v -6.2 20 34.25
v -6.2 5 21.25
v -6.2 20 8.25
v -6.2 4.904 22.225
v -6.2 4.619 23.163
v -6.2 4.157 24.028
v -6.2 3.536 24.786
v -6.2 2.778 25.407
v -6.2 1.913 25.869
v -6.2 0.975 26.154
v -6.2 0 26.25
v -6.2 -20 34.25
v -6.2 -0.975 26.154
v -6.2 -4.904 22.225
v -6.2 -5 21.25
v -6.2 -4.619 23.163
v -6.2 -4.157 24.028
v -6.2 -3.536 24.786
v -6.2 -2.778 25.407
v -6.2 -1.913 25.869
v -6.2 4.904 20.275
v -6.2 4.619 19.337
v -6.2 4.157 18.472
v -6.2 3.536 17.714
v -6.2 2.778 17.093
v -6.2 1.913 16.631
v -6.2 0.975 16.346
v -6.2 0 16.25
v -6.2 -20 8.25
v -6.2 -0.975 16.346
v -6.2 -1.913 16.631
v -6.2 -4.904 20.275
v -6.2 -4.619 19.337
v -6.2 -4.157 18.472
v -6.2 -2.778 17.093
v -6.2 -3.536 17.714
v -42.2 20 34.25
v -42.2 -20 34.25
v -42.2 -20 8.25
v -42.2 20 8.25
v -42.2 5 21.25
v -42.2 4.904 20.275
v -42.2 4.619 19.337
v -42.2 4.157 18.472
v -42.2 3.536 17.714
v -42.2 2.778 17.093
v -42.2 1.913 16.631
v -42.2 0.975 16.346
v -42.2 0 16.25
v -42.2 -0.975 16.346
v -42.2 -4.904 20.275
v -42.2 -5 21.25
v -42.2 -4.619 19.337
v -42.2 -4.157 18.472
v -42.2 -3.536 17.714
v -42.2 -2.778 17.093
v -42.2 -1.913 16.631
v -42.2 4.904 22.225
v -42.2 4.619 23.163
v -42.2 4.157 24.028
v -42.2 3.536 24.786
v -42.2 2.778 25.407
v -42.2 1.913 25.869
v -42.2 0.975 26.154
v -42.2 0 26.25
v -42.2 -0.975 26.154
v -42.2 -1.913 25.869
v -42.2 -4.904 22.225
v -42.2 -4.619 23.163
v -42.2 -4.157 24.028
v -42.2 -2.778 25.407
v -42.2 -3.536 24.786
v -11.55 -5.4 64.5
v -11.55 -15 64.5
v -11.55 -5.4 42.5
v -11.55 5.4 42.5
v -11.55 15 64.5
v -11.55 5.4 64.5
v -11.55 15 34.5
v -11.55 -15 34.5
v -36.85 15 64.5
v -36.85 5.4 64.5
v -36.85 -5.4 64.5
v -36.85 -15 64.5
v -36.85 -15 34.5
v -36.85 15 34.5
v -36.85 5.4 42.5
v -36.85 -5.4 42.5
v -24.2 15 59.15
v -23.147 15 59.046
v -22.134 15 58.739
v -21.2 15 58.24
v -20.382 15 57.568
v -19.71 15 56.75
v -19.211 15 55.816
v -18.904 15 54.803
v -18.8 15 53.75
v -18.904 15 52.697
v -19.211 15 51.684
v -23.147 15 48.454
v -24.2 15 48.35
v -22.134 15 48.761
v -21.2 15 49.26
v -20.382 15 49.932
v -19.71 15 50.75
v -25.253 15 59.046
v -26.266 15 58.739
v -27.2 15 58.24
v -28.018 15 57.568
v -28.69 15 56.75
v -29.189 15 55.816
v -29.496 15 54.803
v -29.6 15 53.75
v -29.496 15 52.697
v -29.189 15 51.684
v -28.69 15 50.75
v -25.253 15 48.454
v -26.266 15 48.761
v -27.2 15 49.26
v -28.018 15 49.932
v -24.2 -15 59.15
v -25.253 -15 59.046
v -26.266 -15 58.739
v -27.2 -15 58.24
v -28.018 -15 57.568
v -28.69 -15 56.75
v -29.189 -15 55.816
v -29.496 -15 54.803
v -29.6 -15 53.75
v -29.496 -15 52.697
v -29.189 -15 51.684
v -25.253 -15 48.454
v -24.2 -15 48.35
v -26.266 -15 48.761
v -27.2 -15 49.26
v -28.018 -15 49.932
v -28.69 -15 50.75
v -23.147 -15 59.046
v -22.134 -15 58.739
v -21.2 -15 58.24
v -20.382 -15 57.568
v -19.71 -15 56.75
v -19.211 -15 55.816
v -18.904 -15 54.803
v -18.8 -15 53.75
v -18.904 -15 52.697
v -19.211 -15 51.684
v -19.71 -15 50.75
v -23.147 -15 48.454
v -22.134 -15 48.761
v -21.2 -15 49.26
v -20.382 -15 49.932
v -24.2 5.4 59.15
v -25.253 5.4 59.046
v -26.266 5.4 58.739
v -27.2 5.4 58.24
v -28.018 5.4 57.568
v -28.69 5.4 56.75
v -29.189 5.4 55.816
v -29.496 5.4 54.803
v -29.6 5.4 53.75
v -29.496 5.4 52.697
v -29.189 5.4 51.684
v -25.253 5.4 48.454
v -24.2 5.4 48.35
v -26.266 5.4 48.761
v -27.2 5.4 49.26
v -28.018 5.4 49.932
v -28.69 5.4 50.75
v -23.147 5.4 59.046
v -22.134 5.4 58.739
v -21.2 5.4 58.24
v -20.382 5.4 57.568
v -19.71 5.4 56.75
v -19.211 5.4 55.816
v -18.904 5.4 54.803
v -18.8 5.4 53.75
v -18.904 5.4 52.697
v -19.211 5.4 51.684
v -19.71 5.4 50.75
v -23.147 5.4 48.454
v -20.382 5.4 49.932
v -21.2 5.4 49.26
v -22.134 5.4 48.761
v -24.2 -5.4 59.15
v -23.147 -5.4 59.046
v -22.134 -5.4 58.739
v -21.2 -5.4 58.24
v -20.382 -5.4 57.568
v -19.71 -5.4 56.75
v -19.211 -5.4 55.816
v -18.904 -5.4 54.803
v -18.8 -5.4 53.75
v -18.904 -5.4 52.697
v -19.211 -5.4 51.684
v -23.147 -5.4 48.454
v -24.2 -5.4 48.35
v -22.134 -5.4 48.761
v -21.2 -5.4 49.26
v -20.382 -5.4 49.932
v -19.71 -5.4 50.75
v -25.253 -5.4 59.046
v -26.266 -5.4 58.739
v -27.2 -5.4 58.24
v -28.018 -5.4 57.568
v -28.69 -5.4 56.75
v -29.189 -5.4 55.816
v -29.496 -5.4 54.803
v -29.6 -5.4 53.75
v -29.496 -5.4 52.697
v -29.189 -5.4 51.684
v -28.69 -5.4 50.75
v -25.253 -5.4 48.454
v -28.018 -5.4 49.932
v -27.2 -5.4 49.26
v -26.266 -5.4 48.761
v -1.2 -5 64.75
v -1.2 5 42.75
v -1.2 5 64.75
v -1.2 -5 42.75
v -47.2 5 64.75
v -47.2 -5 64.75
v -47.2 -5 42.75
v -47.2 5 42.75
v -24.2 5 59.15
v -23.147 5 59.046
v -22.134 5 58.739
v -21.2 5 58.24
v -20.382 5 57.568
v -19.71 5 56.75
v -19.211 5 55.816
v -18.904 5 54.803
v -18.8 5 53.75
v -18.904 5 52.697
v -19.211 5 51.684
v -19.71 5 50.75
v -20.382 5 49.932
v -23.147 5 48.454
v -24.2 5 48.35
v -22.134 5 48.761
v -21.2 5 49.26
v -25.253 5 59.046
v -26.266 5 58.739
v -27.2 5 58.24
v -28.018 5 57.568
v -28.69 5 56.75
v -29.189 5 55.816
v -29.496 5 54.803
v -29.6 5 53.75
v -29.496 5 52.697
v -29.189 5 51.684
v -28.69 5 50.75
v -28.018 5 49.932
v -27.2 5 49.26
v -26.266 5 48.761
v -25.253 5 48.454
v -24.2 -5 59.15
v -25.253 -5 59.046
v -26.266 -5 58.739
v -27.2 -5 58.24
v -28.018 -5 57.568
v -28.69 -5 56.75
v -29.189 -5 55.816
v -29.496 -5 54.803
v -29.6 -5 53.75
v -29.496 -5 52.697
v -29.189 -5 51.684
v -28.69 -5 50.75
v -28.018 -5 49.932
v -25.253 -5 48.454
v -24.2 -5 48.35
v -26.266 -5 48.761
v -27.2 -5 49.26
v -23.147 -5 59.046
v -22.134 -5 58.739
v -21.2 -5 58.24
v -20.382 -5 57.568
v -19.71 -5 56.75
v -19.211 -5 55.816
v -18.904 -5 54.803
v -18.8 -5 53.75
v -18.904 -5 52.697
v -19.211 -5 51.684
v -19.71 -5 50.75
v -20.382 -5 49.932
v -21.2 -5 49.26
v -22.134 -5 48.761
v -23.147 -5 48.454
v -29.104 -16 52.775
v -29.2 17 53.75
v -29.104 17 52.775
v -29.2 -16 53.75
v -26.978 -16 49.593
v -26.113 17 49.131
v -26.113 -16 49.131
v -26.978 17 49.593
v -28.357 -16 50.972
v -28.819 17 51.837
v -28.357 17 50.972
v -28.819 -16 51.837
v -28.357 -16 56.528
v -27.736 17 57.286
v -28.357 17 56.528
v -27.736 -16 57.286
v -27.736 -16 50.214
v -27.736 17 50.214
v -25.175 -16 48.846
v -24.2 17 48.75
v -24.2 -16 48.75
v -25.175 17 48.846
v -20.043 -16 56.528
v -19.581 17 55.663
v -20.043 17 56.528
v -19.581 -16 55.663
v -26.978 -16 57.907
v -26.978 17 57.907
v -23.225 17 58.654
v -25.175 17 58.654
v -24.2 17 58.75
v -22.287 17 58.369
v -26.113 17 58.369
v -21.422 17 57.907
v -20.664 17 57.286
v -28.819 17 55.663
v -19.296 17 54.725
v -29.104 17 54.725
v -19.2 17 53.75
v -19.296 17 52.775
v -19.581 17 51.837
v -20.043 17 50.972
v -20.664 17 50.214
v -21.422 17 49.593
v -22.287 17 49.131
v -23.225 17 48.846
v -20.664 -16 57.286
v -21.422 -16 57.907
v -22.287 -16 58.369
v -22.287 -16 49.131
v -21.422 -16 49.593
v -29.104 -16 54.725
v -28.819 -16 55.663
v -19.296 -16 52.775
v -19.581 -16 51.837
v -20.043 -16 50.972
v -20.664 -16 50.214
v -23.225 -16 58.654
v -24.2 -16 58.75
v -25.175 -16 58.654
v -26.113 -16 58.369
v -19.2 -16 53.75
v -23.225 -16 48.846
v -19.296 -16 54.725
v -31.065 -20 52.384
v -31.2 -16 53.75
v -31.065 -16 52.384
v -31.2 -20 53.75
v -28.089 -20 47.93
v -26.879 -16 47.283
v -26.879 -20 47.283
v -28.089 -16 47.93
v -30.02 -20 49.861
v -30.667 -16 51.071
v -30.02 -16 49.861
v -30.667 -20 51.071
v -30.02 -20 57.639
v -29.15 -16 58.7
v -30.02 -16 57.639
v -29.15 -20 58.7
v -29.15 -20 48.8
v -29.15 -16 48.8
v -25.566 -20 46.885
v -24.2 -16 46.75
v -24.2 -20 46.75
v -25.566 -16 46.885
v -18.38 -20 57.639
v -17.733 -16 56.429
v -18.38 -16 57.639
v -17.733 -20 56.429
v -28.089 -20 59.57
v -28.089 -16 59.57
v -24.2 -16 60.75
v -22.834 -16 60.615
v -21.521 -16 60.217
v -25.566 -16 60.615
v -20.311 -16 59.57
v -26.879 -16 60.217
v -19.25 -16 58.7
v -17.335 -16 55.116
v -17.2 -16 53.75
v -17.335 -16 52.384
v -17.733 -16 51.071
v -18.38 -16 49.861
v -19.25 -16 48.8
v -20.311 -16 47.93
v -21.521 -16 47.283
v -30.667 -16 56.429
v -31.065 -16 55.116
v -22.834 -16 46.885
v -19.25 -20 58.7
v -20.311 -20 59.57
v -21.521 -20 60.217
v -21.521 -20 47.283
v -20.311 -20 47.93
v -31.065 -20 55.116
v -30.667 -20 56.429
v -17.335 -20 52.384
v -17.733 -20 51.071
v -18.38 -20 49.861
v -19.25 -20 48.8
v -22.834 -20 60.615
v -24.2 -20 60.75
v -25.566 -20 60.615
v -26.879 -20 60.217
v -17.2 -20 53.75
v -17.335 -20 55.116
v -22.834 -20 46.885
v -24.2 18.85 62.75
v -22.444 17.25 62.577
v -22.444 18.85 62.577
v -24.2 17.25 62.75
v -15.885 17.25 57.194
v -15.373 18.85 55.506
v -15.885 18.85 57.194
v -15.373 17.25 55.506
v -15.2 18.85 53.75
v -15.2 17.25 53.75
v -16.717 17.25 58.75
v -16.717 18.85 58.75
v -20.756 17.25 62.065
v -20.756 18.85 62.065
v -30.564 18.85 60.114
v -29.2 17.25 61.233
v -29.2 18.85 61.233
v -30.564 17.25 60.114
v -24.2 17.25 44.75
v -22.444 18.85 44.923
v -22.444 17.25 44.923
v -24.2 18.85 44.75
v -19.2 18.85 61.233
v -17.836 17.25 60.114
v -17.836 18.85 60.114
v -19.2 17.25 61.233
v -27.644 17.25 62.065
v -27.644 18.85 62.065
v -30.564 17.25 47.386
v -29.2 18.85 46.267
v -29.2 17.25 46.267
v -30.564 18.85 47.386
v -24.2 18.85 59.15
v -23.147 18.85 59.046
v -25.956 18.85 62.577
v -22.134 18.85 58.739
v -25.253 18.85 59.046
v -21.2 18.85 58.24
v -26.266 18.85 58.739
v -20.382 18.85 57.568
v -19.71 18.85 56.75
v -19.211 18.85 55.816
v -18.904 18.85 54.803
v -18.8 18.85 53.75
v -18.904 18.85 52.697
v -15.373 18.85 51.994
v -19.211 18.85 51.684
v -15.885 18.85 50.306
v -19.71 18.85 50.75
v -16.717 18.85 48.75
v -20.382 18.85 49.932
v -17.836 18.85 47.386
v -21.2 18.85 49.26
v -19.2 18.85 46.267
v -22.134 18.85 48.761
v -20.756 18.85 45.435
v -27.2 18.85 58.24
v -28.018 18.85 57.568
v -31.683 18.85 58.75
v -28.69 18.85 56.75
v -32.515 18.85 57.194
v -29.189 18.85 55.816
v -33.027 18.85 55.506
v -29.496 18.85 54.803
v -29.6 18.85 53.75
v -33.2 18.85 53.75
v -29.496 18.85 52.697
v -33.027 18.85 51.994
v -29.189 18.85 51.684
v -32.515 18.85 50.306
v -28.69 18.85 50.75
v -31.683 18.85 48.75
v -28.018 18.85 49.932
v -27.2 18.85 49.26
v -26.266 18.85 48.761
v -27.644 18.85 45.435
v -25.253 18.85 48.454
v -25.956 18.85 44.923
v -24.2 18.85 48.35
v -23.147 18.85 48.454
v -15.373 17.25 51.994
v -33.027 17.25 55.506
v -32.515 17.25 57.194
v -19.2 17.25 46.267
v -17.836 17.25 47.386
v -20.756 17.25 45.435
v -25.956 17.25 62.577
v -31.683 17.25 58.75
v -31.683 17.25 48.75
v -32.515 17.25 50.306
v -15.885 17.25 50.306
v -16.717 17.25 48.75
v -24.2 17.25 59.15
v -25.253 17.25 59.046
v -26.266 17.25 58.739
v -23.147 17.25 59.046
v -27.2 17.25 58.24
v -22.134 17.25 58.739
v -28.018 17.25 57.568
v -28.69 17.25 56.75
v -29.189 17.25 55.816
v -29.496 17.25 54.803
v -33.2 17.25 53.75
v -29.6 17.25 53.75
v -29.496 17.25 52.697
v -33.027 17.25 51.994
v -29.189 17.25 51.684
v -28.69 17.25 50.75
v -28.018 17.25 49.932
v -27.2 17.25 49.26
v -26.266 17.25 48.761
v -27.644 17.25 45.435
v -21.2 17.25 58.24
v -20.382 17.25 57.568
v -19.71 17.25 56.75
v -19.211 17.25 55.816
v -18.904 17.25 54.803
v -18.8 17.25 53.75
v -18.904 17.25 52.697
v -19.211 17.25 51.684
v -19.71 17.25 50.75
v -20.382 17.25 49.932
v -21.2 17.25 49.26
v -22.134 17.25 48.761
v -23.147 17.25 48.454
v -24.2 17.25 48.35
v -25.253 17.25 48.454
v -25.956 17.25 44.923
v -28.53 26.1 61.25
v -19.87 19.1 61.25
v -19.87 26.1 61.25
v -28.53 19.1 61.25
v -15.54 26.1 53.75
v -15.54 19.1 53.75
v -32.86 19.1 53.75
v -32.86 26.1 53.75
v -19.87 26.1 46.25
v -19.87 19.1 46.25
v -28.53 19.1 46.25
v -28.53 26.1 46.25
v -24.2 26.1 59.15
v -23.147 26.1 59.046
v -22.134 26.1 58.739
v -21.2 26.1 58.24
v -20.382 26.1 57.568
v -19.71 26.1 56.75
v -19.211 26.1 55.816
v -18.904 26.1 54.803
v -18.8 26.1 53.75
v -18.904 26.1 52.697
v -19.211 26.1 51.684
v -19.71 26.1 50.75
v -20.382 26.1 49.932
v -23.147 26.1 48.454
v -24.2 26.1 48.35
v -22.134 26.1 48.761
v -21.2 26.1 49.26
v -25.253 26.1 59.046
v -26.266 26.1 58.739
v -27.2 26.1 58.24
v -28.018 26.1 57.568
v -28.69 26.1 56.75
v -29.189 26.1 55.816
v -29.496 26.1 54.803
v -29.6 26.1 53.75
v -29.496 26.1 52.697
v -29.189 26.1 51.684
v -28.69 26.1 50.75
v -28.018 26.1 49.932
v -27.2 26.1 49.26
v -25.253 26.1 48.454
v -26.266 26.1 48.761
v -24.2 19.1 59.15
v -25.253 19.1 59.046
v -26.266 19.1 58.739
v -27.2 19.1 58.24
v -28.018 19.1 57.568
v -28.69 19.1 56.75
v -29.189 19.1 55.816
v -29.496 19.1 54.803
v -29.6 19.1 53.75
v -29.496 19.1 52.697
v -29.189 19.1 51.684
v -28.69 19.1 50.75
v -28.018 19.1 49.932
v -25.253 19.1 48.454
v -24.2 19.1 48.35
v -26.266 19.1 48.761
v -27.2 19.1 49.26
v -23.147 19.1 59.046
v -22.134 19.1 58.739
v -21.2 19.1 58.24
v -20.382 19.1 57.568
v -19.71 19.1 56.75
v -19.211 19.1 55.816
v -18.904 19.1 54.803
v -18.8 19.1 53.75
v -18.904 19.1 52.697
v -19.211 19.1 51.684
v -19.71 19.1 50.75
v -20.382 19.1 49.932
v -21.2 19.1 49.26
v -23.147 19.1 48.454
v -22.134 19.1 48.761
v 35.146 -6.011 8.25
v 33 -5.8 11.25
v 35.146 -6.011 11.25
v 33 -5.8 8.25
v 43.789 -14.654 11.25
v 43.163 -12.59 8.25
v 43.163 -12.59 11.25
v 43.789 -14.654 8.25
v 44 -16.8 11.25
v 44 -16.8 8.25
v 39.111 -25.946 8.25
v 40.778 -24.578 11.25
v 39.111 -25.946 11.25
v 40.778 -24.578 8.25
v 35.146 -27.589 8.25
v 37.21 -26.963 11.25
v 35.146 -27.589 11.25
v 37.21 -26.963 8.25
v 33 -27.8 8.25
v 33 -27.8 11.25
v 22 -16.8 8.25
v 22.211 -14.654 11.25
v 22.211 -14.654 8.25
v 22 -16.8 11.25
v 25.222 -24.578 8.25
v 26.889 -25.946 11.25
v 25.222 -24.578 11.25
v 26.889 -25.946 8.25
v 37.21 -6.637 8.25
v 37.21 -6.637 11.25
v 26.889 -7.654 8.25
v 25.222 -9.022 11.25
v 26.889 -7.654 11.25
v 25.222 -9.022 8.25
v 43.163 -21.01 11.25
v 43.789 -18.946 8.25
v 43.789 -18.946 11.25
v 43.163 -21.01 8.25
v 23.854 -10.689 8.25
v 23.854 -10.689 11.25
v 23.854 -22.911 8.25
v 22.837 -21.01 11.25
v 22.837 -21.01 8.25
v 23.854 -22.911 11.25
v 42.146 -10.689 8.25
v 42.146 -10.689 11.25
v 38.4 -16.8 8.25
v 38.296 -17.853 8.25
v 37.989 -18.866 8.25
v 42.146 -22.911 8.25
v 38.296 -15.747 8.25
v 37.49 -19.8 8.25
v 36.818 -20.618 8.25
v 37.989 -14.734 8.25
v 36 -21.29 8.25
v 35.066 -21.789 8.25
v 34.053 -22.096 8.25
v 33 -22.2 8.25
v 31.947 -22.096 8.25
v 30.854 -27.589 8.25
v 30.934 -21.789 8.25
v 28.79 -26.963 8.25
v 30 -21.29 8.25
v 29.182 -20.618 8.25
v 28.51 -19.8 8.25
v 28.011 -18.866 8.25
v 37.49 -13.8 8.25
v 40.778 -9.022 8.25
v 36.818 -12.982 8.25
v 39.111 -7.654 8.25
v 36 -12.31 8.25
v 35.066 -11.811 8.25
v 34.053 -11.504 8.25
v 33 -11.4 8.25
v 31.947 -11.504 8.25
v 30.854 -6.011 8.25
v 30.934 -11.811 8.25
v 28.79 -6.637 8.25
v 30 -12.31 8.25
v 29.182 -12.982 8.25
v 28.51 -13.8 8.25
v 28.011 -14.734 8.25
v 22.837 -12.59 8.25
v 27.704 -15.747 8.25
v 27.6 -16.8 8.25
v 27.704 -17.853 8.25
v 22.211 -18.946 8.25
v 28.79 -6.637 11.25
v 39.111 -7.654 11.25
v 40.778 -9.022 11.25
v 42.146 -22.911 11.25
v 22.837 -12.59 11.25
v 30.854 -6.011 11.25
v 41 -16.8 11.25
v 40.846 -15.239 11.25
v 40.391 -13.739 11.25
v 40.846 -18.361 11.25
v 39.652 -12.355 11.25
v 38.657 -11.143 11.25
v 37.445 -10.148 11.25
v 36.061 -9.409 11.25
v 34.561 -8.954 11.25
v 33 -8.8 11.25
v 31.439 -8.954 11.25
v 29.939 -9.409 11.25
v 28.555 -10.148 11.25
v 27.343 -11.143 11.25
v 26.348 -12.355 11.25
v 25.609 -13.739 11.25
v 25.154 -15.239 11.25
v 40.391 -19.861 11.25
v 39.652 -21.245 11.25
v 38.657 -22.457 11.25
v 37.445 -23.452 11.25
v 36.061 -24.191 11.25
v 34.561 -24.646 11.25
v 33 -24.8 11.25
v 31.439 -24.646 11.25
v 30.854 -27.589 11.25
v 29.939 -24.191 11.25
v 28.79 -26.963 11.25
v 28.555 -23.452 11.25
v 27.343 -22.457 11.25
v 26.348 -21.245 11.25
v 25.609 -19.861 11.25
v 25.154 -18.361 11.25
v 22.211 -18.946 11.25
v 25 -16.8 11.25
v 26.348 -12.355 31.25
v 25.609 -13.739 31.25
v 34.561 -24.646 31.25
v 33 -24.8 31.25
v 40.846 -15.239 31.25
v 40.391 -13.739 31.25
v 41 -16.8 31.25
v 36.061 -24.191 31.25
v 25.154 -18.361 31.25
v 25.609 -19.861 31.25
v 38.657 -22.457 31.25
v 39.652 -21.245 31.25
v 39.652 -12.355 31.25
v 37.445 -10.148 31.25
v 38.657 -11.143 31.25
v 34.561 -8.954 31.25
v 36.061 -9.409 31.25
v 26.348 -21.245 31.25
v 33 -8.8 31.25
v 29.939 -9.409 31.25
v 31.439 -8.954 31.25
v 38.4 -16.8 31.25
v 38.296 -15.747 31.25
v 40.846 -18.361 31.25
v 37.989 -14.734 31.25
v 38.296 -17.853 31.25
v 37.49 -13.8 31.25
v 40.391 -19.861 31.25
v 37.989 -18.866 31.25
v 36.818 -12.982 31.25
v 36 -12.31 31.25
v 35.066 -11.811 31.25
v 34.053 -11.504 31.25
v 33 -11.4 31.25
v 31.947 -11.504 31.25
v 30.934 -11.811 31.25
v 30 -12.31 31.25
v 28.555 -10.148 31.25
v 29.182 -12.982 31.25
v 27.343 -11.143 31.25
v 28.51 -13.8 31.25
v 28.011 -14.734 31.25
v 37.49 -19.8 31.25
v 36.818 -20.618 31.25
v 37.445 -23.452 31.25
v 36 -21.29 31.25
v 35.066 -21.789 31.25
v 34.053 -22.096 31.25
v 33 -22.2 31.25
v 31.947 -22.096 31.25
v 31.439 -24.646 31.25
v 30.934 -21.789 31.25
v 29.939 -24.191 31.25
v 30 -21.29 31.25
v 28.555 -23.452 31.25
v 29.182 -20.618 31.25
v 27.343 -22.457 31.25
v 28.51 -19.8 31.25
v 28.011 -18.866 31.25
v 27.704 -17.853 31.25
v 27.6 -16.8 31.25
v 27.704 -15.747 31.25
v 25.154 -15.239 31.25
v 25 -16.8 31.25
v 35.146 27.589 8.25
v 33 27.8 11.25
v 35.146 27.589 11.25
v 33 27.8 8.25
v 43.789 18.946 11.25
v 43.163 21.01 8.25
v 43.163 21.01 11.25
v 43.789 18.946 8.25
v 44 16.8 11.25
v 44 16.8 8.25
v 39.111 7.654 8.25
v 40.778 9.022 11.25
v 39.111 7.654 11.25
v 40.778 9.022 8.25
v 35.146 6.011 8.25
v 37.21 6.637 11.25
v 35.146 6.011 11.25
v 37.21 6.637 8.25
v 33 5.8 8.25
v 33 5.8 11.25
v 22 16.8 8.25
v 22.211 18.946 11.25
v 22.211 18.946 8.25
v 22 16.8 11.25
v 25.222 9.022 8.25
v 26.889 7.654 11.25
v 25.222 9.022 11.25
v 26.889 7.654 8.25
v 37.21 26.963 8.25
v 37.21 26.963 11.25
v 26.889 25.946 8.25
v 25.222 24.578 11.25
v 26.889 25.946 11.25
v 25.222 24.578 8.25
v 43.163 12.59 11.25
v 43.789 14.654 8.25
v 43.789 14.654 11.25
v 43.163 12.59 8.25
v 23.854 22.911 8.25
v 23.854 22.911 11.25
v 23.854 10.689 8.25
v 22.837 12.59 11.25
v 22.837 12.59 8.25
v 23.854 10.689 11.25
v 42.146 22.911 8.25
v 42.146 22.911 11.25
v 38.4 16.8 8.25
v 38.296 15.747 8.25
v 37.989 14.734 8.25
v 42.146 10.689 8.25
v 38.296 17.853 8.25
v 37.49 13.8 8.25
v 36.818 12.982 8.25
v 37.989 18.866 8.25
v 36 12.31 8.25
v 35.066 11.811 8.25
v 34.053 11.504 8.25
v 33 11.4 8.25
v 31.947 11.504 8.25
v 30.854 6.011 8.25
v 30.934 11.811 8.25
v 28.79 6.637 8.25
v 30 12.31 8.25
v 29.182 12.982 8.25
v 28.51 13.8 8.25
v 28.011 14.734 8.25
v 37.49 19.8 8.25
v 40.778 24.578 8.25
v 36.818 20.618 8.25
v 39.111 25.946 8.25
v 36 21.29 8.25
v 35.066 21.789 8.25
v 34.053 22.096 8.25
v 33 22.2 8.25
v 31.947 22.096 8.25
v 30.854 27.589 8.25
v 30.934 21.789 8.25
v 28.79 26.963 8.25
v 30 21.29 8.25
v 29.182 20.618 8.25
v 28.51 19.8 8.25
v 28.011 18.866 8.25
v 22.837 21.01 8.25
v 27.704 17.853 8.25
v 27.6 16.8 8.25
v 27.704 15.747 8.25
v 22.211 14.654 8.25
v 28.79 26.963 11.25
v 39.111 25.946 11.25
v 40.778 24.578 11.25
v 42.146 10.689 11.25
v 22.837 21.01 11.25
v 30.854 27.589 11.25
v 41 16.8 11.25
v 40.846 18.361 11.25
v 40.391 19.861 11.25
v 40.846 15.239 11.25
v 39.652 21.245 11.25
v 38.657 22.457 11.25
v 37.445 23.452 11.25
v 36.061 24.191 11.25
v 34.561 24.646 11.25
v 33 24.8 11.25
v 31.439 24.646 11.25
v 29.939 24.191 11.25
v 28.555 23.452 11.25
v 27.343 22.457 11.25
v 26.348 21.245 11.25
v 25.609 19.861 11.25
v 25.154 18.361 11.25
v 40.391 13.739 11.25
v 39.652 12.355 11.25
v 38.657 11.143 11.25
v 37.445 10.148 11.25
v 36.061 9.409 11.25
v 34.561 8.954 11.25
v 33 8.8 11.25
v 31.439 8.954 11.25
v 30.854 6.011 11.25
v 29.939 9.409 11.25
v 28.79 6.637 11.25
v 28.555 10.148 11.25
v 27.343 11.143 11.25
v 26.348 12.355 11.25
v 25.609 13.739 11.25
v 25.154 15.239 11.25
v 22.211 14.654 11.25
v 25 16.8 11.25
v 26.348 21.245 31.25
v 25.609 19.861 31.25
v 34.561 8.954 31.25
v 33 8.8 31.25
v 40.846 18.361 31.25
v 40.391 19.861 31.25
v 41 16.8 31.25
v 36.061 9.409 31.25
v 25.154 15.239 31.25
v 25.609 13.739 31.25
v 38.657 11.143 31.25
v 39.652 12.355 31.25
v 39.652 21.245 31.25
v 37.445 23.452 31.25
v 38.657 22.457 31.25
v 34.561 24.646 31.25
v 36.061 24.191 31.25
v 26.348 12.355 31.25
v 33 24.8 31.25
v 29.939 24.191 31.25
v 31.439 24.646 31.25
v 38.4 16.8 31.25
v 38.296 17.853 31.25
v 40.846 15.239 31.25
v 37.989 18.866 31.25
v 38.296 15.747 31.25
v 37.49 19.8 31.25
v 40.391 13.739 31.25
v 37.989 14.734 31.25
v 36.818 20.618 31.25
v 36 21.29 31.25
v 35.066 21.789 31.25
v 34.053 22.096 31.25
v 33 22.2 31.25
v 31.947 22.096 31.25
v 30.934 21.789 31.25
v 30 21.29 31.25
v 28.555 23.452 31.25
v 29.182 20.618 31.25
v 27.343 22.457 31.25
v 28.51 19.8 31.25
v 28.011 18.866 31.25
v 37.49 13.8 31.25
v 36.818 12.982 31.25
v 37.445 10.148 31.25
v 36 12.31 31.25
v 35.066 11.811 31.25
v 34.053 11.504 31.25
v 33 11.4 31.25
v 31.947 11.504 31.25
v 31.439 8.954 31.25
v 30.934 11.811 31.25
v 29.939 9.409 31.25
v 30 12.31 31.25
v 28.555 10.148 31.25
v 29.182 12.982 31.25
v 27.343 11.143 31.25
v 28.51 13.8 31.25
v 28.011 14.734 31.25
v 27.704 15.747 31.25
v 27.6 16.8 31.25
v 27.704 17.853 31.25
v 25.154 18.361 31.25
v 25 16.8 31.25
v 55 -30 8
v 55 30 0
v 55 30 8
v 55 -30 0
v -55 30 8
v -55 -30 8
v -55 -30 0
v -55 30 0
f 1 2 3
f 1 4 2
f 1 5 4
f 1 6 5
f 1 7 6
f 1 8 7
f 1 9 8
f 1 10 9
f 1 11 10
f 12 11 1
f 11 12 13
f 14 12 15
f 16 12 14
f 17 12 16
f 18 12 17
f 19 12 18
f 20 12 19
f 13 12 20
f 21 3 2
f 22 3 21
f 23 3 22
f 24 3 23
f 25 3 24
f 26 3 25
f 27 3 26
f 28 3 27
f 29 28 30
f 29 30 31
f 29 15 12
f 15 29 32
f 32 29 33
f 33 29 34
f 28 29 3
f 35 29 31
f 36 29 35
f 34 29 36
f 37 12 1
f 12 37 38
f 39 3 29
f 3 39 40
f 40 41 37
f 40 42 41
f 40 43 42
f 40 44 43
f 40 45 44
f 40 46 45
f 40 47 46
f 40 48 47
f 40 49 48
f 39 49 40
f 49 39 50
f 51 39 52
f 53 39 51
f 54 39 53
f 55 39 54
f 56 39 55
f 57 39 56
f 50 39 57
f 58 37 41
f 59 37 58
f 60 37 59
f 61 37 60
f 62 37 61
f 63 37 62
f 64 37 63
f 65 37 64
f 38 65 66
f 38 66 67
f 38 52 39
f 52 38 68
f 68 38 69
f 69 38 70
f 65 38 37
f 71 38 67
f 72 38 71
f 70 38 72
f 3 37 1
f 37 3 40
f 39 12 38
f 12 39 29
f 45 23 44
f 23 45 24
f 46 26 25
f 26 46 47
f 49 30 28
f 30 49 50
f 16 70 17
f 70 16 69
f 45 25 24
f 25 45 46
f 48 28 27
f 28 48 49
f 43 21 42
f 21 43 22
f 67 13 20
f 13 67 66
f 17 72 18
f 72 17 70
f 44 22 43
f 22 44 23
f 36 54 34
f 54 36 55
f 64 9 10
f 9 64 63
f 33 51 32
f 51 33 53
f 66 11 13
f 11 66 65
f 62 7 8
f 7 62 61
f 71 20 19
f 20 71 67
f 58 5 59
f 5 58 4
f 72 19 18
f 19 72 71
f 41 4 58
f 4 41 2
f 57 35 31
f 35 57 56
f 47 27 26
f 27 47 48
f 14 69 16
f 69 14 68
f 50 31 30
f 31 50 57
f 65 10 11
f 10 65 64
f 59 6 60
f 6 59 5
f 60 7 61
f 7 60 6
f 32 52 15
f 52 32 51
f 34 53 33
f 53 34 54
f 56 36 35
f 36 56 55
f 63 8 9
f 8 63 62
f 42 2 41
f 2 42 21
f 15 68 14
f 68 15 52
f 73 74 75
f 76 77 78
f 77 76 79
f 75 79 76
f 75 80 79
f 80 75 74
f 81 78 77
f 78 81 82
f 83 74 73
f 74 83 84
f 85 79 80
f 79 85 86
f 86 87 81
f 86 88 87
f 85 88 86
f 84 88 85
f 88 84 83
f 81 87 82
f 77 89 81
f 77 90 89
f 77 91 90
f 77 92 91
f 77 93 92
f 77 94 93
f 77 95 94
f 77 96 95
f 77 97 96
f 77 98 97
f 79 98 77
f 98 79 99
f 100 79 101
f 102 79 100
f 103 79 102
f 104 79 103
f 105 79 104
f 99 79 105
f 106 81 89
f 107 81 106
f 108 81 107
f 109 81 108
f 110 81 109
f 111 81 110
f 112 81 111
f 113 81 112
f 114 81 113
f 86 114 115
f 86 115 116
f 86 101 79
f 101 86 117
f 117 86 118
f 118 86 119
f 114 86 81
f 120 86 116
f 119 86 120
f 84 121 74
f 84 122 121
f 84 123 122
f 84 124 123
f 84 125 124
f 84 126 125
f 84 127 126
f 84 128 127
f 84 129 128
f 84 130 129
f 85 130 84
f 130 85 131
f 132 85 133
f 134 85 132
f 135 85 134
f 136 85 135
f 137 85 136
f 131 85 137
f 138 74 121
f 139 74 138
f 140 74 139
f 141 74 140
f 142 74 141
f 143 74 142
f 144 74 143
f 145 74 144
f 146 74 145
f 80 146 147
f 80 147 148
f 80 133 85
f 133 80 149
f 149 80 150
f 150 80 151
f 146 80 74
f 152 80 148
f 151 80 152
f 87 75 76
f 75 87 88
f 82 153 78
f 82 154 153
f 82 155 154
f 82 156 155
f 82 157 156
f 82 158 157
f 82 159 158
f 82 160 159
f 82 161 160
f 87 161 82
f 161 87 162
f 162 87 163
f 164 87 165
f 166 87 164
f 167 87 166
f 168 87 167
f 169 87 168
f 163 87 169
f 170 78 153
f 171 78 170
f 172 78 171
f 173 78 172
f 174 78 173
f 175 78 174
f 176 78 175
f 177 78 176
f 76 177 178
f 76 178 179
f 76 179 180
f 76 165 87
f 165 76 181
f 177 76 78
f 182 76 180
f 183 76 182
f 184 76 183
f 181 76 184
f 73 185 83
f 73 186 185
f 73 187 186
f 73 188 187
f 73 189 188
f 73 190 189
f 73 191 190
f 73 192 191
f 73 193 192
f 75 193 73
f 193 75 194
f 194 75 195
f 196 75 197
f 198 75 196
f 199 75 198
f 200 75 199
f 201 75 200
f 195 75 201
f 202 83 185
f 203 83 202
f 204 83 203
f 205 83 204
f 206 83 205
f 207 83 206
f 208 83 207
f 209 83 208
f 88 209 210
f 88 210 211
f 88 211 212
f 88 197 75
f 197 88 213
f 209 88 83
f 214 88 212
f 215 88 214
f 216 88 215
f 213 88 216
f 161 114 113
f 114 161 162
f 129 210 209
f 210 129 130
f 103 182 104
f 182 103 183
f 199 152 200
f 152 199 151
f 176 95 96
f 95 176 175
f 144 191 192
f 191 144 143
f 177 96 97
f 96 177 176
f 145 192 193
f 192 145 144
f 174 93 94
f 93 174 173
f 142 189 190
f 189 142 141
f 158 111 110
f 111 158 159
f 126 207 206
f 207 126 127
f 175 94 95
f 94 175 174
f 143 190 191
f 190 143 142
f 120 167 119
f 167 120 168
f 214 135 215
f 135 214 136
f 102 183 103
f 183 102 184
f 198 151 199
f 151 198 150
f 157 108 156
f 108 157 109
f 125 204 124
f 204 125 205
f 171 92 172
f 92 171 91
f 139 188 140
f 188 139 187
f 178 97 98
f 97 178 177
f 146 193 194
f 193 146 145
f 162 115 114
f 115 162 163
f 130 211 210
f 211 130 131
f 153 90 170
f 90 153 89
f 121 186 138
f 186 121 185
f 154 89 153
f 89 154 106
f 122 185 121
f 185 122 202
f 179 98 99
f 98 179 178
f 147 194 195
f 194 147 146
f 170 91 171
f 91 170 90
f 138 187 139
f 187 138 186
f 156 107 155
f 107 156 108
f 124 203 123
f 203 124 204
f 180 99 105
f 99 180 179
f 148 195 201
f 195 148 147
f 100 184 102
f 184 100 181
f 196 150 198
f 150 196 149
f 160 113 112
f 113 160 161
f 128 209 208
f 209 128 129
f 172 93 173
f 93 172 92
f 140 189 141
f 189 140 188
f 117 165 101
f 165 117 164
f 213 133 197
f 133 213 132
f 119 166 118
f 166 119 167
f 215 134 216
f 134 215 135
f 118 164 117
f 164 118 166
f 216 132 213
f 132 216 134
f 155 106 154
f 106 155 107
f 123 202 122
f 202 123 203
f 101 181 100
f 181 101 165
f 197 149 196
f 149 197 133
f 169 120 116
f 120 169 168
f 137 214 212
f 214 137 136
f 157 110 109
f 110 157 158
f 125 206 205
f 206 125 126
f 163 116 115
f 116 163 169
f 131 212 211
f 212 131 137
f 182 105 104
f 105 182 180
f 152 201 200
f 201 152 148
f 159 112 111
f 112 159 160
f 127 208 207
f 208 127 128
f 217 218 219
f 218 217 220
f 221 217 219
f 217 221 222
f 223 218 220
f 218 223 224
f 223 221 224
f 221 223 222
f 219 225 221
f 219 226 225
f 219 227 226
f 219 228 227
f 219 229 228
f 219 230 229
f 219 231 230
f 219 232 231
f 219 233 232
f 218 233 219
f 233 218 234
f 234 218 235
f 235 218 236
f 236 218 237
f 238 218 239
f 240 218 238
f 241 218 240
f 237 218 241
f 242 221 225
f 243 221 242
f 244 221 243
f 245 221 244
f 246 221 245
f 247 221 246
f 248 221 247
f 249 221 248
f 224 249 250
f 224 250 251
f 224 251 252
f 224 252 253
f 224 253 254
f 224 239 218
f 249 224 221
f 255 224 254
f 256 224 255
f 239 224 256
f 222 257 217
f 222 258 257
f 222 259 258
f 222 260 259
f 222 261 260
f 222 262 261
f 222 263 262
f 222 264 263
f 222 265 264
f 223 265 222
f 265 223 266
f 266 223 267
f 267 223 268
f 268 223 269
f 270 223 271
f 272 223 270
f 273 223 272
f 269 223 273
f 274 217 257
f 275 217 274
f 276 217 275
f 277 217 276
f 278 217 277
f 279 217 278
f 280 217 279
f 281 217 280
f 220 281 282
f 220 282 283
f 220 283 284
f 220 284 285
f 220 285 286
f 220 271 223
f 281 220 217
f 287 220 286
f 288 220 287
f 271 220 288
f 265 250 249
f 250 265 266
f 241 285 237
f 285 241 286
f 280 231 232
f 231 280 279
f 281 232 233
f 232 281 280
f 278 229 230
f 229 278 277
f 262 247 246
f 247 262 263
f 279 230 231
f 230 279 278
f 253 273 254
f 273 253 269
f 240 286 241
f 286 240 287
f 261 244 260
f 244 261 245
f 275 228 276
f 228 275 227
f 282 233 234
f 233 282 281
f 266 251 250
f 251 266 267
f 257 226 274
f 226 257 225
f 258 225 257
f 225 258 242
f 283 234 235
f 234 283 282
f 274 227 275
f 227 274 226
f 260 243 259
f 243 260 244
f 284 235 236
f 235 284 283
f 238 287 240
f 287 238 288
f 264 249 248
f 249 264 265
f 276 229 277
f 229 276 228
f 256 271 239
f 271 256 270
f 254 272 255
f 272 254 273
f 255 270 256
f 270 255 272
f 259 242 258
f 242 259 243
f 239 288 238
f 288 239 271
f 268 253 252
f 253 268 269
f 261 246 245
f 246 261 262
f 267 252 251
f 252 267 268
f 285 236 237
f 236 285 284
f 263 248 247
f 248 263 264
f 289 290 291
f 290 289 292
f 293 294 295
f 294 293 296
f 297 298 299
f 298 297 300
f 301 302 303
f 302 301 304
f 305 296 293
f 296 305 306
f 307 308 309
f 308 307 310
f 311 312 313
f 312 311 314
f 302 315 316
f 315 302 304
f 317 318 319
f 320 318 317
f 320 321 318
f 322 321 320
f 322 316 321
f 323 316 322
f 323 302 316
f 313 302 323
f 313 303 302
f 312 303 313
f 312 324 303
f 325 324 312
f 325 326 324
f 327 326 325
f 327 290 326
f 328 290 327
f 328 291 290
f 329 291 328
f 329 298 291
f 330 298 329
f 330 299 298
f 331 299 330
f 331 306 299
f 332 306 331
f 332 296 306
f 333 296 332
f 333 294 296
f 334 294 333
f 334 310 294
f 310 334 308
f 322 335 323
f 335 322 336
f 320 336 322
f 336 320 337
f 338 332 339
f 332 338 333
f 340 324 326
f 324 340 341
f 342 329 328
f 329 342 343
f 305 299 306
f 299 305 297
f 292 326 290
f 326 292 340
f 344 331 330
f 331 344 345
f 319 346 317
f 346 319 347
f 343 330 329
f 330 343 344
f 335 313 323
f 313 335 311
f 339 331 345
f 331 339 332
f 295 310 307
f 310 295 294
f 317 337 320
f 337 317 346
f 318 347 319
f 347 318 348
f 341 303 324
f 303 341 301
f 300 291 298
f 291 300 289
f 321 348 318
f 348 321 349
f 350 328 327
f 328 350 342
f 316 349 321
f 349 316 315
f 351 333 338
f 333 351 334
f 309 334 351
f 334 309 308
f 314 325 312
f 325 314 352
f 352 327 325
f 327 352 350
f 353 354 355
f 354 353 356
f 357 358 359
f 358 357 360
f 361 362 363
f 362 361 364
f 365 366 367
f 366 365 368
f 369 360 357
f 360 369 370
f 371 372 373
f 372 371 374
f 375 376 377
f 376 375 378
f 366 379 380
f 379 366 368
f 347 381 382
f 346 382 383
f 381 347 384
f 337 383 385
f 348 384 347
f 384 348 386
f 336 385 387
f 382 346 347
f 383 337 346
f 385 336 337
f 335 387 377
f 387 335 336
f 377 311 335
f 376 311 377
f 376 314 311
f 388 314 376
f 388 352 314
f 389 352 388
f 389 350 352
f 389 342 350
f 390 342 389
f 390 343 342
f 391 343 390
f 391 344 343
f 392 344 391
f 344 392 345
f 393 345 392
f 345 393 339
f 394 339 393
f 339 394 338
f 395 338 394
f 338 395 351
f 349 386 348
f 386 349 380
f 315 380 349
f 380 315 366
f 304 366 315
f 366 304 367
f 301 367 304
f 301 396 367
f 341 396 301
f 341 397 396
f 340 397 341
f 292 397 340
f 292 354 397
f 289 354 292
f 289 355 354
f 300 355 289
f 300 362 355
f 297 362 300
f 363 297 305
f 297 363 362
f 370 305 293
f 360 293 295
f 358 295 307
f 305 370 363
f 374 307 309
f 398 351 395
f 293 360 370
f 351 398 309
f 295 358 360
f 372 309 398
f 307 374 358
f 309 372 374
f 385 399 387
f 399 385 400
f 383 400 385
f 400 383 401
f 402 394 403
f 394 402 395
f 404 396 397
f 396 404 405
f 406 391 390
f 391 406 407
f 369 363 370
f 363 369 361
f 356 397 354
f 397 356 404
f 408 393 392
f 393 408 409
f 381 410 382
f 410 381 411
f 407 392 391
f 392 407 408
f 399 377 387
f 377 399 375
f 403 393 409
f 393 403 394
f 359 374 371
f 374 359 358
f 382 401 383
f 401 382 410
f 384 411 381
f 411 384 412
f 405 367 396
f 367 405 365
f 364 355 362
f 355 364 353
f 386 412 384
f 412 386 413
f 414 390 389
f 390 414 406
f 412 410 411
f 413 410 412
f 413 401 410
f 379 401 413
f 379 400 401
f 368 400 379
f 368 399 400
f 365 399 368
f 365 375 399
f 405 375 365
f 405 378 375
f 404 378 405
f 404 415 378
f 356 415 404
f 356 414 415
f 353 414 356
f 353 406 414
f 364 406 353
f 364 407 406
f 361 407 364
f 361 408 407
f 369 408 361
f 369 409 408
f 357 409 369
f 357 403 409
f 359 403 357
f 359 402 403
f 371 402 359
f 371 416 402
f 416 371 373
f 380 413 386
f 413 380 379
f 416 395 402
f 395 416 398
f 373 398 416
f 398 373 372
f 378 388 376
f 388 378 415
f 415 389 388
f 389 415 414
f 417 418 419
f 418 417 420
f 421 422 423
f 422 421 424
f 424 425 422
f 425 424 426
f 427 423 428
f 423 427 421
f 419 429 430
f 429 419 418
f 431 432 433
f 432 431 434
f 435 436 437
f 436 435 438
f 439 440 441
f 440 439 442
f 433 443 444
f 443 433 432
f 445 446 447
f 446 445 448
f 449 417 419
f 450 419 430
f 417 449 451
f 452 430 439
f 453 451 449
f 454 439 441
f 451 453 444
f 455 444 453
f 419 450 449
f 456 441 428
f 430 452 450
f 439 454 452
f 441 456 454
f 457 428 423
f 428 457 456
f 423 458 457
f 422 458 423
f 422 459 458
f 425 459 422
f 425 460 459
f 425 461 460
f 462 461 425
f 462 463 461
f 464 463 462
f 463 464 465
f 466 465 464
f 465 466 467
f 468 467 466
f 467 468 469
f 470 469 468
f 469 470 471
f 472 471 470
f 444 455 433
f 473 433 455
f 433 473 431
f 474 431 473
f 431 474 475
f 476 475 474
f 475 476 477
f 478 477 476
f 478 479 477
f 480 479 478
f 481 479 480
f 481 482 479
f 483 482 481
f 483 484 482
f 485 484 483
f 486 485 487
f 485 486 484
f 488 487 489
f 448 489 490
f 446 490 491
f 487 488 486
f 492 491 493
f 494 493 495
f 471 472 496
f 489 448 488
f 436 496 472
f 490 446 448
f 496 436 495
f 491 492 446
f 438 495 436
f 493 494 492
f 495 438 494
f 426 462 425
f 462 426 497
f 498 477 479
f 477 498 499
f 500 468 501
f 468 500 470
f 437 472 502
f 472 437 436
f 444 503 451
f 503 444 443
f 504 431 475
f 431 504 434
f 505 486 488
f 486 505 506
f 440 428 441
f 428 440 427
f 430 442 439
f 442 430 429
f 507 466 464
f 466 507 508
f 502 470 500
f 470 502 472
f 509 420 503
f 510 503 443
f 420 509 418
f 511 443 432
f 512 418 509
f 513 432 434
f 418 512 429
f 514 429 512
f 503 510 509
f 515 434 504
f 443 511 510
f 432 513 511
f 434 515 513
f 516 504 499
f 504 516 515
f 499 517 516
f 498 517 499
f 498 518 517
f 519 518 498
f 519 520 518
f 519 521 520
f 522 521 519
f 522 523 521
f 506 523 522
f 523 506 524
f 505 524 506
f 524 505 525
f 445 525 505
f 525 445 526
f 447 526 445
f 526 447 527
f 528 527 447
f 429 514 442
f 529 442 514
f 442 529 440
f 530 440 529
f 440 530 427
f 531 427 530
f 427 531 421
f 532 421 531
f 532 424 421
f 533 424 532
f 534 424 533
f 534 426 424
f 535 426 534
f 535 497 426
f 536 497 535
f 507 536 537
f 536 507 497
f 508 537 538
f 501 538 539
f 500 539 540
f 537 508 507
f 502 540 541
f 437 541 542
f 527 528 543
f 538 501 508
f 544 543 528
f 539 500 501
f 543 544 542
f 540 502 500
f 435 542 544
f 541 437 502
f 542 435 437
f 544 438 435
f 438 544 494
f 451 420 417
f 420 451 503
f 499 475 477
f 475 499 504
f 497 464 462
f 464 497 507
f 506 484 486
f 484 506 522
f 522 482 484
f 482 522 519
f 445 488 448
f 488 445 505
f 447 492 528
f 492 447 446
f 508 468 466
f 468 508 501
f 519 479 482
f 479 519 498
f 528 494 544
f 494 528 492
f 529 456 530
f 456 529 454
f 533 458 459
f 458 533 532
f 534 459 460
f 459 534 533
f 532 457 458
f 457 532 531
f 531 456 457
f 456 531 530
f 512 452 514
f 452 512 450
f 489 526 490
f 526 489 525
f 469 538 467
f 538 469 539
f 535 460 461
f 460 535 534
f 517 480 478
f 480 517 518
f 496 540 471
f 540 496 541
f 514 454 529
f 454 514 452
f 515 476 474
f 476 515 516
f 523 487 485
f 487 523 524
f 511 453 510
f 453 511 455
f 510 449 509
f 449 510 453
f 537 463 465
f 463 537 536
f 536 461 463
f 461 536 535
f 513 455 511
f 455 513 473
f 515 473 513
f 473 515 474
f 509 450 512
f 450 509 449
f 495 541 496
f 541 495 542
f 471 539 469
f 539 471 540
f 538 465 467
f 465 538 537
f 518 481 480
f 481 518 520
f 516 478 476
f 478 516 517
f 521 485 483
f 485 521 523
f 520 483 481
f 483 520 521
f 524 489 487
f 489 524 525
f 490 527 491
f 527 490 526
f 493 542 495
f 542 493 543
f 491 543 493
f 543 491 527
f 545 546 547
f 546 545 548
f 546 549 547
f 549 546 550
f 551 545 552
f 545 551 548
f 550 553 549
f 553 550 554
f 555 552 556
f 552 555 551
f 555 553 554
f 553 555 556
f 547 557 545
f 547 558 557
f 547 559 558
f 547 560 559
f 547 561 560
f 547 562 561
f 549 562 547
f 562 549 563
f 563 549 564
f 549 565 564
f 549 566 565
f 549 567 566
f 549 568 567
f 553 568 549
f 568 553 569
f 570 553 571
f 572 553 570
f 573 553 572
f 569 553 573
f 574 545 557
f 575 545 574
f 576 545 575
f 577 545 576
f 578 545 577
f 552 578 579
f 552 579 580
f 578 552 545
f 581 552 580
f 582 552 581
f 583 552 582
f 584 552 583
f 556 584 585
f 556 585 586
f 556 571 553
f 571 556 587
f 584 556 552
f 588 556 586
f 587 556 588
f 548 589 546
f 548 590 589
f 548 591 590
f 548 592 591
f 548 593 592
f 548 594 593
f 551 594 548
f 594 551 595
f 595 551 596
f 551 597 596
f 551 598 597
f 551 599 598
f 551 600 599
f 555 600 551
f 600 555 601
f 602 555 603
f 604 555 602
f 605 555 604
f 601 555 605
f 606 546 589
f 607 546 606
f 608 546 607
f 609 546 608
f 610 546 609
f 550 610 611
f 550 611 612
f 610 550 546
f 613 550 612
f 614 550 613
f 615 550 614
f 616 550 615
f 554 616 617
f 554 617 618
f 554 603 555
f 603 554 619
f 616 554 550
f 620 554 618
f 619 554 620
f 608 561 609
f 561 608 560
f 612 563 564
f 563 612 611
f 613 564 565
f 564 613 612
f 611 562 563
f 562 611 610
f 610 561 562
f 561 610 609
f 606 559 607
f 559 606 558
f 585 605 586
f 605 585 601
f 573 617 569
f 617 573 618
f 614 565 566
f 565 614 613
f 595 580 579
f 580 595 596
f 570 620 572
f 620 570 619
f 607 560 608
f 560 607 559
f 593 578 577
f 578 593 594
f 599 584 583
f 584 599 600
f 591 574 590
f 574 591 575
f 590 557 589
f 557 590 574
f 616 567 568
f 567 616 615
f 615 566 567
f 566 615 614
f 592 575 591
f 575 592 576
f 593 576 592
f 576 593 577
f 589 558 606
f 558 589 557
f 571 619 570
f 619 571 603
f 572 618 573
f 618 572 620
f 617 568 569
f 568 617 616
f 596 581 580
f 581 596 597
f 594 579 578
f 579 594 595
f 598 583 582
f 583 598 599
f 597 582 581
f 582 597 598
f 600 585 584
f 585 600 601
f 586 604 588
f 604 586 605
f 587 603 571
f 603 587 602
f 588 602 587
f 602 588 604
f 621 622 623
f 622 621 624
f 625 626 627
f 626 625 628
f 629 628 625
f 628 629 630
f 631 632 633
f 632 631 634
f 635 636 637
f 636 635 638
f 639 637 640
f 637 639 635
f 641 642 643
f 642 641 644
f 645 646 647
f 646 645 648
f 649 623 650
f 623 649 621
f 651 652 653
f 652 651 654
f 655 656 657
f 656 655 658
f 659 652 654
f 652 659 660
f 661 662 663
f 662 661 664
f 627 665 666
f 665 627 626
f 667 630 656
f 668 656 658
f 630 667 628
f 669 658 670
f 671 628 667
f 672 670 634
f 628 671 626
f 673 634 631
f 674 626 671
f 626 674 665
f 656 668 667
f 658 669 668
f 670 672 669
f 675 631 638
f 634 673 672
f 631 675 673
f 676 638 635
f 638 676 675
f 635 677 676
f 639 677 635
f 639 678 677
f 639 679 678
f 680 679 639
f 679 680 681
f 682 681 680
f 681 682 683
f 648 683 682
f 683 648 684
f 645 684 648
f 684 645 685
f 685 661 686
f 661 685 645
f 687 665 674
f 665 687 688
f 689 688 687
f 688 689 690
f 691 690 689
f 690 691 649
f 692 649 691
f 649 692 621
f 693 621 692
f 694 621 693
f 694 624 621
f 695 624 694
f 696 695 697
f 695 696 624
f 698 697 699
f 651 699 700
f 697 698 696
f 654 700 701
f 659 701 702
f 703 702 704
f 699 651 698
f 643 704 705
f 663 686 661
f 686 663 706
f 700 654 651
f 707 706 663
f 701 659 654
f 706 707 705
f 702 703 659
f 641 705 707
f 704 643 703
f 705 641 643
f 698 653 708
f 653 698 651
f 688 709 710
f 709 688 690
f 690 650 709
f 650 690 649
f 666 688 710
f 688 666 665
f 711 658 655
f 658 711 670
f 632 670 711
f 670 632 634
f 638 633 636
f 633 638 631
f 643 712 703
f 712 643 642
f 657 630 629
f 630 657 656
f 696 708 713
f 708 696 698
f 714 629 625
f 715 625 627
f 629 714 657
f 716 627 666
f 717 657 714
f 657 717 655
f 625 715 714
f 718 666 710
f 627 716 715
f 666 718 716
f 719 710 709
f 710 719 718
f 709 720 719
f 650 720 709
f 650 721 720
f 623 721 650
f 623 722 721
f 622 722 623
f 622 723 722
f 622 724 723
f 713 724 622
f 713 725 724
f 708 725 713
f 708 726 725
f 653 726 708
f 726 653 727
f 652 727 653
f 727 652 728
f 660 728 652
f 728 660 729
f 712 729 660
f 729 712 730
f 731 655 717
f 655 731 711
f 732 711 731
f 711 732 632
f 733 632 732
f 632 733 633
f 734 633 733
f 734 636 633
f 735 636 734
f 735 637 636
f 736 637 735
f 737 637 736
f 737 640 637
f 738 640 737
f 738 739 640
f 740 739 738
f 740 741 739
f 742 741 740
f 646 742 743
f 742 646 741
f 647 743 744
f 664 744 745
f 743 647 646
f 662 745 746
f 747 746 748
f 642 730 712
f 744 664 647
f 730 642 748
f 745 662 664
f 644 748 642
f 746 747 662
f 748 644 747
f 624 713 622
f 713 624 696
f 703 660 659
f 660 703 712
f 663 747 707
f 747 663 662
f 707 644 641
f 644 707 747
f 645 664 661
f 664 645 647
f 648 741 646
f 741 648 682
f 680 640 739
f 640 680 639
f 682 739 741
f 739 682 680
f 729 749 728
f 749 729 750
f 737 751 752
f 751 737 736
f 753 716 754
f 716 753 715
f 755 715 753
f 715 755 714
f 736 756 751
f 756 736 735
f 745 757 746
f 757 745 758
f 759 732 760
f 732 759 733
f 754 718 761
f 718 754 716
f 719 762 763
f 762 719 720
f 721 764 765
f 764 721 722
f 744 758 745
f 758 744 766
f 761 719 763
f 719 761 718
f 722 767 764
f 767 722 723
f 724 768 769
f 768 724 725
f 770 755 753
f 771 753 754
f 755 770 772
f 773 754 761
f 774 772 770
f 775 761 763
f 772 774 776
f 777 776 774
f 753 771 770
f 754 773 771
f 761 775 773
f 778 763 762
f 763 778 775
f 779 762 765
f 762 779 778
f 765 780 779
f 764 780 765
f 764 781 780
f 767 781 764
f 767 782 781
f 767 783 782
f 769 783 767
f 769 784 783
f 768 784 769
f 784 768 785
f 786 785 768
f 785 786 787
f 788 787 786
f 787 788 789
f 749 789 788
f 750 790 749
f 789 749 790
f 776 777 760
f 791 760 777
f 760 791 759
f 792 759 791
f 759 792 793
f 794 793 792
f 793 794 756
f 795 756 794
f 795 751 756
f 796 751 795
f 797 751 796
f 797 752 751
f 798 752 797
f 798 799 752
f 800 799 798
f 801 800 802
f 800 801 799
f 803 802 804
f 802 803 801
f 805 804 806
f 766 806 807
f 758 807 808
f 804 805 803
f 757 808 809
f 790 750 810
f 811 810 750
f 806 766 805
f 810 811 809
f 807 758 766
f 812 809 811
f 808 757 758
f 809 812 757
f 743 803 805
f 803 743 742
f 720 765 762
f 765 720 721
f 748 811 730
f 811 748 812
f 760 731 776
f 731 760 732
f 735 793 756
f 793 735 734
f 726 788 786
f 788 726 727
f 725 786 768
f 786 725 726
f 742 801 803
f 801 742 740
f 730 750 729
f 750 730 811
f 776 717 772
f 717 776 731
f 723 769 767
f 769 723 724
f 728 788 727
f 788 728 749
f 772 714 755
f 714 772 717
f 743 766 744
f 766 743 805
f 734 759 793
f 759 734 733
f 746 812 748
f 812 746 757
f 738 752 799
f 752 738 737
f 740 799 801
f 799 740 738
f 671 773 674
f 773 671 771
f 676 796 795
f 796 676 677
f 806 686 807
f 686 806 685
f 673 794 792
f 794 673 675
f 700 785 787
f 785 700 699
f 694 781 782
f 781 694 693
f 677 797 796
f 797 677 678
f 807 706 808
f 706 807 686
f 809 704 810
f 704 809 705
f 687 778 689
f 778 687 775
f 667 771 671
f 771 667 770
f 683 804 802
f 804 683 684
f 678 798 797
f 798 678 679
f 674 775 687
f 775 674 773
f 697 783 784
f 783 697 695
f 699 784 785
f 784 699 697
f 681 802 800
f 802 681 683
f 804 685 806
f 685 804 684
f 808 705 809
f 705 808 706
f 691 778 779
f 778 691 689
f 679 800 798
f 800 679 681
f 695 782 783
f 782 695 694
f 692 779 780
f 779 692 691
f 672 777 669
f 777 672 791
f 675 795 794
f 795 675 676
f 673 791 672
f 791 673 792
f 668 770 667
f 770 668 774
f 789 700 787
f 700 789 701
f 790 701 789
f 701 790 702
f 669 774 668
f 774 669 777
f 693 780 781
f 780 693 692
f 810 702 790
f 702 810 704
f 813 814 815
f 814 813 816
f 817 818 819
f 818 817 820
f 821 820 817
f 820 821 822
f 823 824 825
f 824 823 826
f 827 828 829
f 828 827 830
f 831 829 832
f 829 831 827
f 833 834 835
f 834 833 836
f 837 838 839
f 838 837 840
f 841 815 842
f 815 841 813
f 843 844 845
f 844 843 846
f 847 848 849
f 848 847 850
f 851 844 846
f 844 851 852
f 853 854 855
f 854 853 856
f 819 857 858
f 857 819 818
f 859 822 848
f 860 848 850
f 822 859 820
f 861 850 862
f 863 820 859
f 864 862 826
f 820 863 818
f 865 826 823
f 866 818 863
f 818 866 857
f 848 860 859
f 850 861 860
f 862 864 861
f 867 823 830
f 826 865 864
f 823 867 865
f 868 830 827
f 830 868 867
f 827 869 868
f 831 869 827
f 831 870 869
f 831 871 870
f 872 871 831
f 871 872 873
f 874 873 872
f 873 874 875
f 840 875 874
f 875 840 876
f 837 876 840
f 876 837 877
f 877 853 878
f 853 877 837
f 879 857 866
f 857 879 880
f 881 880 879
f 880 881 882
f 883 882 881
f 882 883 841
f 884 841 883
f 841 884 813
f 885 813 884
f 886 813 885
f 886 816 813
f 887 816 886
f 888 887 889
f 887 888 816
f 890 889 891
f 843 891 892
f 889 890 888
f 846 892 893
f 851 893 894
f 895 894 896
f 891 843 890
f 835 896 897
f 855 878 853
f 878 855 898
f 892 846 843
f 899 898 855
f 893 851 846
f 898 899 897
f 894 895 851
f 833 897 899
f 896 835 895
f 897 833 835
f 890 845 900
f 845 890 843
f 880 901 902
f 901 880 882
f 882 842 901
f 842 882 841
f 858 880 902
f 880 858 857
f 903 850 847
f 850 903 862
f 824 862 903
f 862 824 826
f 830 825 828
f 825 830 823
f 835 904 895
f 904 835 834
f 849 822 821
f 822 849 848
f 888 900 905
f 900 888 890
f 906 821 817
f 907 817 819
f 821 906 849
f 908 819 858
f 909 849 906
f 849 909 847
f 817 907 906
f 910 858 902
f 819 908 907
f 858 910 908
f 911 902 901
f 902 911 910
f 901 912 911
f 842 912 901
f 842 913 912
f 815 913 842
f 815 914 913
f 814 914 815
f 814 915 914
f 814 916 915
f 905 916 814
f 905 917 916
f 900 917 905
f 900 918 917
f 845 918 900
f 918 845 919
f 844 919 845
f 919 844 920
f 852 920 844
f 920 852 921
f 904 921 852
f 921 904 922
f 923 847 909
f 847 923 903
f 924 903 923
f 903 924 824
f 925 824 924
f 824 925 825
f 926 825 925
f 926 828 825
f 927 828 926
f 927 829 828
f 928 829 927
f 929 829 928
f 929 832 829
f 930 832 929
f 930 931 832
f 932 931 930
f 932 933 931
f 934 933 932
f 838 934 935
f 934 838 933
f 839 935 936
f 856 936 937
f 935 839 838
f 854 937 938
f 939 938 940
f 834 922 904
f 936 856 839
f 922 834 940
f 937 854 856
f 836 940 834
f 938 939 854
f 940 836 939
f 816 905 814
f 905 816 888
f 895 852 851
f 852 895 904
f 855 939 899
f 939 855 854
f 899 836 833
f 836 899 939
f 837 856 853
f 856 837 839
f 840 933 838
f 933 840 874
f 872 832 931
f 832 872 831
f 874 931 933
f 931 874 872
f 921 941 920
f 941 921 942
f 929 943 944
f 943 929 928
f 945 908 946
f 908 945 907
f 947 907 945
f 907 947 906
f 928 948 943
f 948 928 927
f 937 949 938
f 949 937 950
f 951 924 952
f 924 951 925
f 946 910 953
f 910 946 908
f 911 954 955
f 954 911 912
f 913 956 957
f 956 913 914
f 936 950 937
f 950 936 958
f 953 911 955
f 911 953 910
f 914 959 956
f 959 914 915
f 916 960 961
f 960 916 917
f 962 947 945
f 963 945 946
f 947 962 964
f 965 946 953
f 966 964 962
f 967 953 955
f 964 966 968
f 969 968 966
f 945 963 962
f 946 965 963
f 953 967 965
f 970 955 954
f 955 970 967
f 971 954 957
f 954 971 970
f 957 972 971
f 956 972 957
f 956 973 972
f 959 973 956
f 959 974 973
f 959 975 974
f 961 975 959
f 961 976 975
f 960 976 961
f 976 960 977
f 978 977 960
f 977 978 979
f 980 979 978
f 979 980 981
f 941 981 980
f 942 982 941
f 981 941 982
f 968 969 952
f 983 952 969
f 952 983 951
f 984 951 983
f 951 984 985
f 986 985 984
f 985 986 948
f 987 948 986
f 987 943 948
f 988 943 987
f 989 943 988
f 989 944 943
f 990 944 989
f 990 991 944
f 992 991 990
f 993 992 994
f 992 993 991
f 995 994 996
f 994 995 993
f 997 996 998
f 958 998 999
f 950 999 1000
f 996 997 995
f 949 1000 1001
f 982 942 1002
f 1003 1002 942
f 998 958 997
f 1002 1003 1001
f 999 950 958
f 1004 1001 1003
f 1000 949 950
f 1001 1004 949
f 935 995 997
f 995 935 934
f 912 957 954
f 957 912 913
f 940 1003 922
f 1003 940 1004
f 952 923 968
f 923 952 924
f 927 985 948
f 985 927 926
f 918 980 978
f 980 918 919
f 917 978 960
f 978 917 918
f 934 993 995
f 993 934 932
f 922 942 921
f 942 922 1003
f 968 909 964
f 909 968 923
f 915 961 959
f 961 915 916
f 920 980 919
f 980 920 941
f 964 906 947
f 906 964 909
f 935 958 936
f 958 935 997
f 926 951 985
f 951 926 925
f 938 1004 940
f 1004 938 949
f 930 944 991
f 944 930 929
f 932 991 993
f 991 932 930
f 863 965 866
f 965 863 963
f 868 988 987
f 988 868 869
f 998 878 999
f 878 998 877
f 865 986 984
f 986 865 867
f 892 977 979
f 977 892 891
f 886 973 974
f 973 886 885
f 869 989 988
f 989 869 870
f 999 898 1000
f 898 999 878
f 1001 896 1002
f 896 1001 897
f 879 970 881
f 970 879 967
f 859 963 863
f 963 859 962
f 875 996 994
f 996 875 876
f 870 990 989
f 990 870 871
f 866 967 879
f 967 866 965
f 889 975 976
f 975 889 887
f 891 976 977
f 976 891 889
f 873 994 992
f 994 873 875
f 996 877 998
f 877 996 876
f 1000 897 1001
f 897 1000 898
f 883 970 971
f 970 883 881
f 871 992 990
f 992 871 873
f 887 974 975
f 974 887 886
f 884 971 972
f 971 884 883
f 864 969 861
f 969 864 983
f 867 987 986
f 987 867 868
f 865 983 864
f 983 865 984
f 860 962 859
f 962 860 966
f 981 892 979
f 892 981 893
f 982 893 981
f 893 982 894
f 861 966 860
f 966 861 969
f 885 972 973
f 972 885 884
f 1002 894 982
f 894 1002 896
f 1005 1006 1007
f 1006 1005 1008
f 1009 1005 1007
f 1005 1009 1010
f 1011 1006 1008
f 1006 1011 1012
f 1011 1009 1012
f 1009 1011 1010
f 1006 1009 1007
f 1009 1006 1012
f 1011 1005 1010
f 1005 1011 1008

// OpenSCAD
$fn = 32;

// ------------------------------------------------------------------------
// Indexing jig: plate 110 x 60 mm, pin d10
// Every part is its own module, assembly() places every instance.
// ------------------------------------------------------------------------

// --- part 1 ---
module jig_plate() {
  difference() {
    translate([-55, -30, 0]) cube([110, 60, 8]);
  }
}

// --- part 2 ---
module locator_block() {
  difference() {
    translate([-18, -20, 0]) cube([36, 40, 26]);
    translate([0, 0, 13]) rotate([0, 90, 0]) cylinder(h = 38, d = 10, center = true);
  }
}

// --- part 3 ---
module index_fork() {
  difference() {
    translate([-12.65, -15, 0]) cube([25.3, 30, 30]);
    translate([-13.65, -5.4, 8]) cube([27.3, 10.8, 23]);
    translate([0, 0, 19.25]) rotate([90, 0, 0]) cylinder(h = 32, d = 10.8, center = true);
  }
}

// --- part 4 ---
module index_arm() {
  difference() {
    translate([-23, -5, 0]) cube([46, 10, 22]);
    translate([0, 0, 11]) rotate([90, 0, 0]) cylinder(h = 12, d = 10.8, center = true);
  }
}

// --- part 5 ---
module index_pin() {
  rotate([0, 90, 0]) cylinder(h = 34, d = 10, center = true);
  translate([-20, 0, 0]) rotate([0, 90, 0]) cylinder(h = 4, d = 14);
}

// --- part 6 ---
module pin_washer() {
  difference() {
      translate([0, 0, 0]) cylinder(h = 1.6, d = 18);
      translate([0, 0, -1]) cylinder(h = 3.6, d = 10.8);
    }
}

// --- part 7 ---
module lock_nut() {
  difference() {
    linear_extrude(height = 7) polygon(points = [[8.66, 0], [4.33, 7.5], [-4.33, 7.5], [-8.66, 0], [-4.33, -7.5], [4.33, -7.5]]);
    translate([0, 0, -1]) cylinder(h = 9, d = 10.8);
  }
}

// --- part 8 ---
module guide_bush_a() {
  difference() {
    union() {
      cylinder(h = 3, d = 22);
      translate([0, 0, 3]) cylinder(h = 20, d = 16);
    }
    translate([0, 0, -1]) cylinder(h = 25, d = 10.8);
  }
}

// --- part 9 ---
module guide_bush_b() {
  difference() {
    union() {
      cylinder(h = 3, d = 22);
      translate([0, 0, 3]) cylinder(h = 20, d = 16);
    }
    translate([0, 0, -1]) cylinder(h = 25, d = 10.8);
  }
}

// --- assembly ---
module assembly() {
  color([0.80, 0.24, 0.20]) translate([0, 0, 0]) rotate([0, 0, 0]) jig_plate();
  color([0.20, 0.45, 0.75]) translate([-24.2, 0, 8.25]) rotate([0, 0, 0]) locator_block();
  color([0.25, 0.62, 0.32]) translate([-24.2, 0, 34.5]) rotate([0, 0, 0]) index_fork();
  color([0.92, 0.70, 0.18]) translate([-24.2, 0, 42.75]) rotate([0, 0, 0]) index_arm();
  color([0.58, 0.35, 0.70]) translate([-24.2, 0, 53.75]) rotate([0, 0, 90]) index_pin();
  color([0.16, 0.66, 0.66]) translate([-24.2, 18.85, 53.75]) rotate([90, 0, 0]) pin_washer();
  color([0.85, 0.48, 0.18]) translate([-24.2, 26.1, 53.75]) rotate([90, 0, 0]) lock_nut();
  color([0.55, 0.60, 0.65]) translate([33, -16.8, 8.25]) rotate([0, 0, 0]) guide_bush_a();
  color([0.75, 0.30, 0.55]) translate([33, 16.8, 8.25]) rotate([0, 0, 0]) guide_bush_b();
}

assembly();
